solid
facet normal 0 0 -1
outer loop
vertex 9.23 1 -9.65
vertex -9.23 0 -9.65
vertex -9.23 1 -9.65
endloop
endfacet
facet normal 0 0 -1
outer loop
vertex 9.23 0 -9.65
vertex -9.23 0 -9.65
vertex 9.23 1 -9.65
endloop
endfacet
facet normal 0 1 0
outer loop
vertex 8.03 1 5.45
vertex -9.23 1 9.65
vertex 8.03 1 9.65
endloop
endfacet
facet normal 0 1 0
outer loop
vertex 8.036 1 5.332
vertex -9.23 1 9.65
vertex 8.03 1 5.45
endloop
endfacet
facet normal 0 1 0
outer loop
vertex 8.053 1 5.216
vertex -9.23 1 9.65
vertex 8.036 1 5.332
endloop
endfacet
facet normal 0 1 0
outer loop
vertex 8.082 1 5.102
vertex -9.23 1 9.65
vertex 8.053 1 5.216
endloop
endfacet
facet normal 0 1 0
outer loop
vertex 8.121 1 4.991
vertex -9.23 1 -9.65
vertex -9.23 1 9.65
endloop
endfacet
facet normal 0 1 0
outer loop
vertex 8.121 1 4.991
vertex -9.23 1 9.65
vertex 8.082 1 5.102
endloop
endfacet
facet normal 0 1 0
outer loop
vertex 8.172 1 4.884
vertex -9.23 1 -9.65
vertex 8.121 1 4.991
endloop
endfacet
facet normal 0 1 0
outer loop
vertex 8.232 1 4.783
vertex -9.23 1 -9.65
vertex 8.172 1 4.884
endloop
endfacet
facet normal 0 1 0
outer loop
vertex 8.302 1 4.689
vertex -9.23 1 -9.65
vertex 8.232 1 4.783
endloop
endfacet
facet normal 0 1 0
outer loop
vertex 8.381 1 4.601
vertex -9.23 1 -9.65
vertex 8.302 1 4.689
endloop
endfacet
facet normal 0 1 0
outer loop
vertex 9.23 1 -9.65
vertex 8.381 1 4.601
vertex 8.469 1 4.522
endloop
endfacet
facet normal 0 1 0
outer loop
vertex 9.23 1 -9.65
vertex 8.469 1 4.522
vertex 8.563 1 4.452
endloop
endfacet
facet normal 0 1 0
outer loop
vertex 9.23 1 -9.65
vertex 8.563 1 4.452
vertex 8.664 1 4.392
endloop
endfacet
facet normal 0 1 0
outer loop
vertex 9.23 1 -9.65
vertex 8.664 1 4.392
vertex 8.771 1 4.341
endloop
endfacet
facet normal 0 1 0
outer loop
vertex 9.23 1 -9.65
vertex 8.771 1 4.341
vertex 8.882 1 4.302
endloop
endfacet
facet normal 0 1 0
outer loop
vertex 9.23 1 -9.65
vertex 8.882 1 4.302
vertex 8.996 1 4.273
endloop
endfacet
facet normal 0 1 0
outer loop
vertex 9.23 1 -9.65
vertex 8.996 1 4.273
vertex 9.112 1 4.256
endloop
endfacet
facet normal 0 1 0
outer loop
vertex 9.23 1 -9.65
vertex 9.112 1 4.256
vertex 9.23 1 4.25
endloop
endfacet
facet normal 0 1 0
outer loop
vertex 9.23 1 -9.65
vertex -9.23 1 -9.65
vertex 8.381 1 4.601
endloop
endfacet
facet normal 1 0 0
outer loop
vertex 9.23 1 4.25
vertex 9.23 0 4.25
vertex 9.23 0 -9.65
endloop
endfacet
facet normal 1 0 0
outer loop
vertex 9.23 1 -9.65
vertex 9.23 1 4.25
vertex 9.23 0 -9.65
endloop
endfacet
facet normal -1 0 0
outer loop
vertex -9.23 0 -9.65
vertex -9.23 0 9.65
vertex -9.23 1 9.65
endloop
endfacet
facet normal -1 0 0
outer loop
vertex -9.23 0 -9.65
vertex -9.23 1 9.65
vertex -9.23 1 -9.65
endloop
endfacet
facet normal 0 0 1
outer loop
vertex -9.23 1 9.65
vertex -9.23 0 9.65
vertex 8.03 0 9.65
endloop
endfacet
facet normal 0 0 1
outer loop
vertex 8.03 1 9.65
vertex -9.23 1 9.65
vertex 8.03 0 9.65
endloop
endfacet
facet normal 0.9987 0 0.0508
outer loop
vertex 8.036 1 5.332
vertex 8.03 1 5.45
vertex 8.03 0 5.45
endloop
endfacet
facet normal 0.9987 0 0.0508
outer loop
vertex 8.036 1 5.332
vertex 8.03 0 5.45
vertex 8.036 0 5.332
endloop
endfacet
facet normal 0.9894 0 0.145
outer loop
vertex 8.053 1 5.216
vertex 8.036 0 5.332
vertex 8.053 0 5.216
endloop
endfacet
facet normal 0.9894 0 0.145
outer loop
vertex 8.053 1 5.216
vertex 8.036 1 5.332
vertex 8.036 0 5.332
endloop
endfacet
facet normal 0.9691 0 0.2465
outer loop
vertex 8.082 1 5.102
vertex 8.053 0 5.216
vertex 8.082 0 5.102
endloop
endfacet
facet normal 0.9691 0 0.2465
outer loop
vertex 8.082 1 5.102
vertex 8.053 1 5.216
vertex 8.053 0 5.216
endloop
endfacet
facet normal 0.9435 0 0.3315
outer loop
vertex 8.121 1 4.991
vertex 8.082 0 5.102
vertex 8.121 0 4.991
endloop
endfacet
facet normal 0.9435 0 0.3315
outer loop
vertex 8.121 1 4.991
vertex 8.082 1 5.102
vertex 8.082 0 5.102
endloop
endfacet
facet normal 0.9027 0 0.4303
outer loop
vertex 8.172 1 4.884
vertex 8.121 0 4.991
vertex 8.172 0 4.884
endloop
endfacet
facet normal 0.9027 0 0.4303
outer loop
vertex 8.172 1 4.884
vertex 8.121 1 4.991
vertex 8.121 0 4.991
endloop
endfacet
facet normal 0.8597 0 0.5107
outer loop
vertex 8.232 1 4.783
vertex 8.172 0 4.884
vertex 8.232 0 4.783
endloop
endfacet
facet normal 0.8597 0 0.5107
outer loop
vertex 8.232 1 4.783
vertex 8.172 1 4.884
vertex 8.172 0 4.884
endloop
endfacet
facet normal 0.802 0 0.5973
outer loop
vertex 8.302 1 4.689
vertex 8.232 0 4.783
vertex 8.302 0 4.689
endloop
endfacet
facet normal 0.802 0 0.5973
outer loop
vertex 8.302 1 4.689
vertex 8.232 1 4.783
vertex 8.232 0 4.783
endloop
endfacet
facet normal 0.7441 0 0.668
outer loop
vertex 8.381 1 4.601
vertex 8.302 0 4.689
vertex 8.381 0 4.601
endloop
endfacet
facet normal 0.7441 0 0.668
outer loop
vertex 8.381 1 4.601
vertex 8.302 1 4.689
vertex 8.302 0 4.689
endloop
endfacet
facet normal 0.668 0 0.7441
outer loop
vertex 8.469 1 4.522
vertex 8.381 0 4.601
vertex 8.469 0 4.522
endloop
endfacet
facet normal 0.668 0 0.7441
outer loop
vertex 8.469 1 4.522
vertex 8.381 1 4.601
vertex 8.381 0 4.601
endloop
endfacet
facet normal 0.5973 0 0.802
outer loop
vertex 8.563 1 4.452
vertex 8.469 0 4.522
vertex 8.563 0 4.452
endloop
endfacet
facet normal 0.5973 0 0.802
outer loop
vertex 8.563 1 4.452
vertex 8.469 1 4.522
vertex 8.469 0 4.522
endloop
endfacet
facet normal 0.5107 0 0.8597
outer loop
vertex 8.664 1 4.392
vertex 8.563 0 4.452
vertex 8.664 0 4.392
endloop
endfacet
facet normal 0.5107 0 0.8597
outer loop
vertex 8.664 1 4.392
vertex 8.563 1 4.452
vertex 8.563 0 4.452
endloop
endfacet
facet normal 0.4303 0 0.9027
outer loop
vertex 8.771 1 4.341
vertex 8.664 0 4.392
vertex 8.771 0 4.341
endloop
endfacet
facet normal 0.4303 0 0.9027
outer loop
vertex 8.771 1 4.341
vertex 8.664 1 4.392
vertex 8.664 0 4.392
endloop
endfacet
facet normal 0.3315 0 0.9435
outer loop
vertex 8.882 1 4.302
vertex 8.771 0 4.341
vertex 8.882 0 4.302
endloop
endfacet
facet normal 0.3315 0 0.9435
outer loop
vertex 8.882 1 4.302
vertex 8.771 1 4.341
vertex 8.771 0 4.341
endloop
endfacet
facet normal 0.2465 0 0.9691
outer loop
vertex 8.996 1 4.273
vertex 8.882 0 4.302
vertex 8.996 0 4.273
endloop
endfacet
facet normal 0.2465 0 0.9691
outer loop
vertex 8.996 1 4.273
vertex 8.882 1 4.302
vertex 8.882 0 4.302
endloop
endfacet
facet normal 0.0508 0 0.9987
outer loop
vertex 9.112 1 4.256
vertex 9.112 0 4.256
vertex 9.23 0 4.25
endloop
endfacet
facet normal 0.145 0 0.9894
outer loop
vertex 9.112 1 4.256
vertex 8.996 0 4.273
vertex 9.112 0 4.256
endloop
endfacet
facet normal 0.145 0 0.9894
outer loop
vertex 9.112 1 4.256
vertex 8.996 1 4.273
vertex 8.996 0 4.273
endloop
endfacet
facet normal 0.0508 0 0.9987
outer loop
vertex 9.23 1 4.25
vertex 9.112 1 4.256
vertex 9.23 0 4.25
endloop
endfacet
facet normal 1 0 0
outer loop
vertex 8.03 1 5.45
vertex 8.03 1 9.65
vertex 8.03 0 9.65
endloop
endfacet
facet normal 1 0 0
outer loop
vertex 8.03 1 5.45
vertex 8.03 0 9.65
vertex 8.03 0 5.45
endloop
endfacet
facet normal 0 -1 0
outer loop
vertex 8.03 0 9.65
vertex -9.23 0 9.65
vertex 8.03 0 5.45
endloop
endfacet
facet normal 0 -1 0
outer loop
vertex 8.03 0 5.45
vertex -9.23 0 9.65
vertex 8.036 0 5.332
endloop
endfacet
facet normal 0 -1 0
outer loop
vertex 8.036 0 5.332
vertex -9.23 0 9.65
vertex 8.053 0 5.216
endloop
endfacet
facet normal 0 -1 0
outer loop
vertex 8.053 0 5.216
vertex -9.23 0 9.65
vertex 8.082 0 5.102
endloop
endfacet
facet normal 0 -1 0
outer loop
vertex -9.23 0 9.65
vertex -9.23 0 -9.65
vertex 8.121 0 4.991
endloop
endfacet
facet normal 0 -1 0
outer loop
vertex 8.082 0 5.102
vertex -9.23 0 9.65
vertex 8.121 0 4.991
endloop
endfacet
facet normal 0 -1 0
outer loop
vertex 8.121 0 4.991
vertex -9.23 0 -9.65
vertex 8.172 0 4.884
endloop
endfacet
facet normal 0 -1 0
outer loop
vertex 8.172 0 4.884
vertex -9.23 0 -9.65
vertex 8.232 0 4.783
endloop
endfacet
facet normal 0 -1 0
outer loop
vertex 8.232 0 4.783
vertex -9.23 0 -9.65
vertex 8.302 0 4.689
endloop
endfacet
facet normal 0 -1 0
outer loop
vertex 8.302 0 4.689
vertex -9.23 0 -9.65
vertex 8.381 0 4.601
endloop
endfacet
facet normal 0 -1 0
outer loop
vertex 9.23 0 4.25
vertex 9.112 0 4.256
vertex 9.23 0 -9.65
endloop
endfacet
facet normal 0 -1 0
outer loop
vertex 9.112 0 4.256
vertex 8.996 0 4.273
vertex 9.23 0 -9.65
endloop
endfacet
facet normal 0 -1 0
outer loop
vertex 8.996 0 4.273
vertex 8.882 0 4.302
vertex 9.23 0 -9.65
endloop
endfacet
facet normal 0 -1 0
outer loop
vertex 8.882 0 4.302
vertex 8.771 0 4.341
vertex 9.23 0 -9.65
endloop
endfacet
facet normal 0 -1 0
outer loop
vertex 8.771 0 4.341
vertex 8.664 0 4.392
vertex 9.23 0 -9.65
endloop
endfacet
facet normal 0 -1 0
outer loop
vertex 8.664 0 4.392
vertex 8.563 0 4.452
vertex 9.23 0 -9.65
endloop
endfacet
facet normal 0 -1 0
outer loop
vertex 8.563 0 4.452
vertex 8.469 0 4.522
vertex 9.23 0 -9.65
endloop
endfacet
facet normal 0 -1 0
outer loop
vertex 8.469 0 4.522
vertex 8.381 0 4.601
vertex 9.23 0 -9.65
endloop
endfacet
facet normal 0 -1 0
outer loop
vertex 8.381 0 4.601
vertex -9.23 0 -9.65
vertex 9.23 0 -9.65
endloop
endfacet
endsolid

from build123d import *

# Parameters (mm, degrees)
SKETCH_1_W          = 18.46
SKETCH_1_H          = 19.3
EXTRUDE_1_DEPTH     = 1
CUT_EXTRUDE_1_DEPTH = 2


with BuildPart() as part:
    # 草图1 → 凸台-拉伸1 (new body)
    with BuildSketch(Plane(origin=(0, 0, 0), x_dir=(1, 0, 0), z_dir=(0, 1, 0))):
        Rectangle(SKETCH_1_W, SKETCH_1_H)
    extrude(amount=EXTRUDE_1_DEPTH)

    # 草图2 → 切除-拉伸1 (cut, through all)
    with BuildSketch(Plane(origin=(0, 1, 0), x_dir=(1, 0, 0), z_dir=(0, 1, 0))):
        with BuildLine():
            Line((9.23, -9.65), (8.03, -9.65))
            Line((8.03, -9.65), (8.03, -5.45))
            ThreePointArc((8.03, -5.45), (8.381471863, -4.601471863), (9.23, -4.25))
            Line((9.23, -4.25), (9.23, -9.65))
        make_face()
    extrude(amount=-CUT_EXTRUDE_1_DEPTH, mode=Mode.SUBTRACT)


solid = part.part
